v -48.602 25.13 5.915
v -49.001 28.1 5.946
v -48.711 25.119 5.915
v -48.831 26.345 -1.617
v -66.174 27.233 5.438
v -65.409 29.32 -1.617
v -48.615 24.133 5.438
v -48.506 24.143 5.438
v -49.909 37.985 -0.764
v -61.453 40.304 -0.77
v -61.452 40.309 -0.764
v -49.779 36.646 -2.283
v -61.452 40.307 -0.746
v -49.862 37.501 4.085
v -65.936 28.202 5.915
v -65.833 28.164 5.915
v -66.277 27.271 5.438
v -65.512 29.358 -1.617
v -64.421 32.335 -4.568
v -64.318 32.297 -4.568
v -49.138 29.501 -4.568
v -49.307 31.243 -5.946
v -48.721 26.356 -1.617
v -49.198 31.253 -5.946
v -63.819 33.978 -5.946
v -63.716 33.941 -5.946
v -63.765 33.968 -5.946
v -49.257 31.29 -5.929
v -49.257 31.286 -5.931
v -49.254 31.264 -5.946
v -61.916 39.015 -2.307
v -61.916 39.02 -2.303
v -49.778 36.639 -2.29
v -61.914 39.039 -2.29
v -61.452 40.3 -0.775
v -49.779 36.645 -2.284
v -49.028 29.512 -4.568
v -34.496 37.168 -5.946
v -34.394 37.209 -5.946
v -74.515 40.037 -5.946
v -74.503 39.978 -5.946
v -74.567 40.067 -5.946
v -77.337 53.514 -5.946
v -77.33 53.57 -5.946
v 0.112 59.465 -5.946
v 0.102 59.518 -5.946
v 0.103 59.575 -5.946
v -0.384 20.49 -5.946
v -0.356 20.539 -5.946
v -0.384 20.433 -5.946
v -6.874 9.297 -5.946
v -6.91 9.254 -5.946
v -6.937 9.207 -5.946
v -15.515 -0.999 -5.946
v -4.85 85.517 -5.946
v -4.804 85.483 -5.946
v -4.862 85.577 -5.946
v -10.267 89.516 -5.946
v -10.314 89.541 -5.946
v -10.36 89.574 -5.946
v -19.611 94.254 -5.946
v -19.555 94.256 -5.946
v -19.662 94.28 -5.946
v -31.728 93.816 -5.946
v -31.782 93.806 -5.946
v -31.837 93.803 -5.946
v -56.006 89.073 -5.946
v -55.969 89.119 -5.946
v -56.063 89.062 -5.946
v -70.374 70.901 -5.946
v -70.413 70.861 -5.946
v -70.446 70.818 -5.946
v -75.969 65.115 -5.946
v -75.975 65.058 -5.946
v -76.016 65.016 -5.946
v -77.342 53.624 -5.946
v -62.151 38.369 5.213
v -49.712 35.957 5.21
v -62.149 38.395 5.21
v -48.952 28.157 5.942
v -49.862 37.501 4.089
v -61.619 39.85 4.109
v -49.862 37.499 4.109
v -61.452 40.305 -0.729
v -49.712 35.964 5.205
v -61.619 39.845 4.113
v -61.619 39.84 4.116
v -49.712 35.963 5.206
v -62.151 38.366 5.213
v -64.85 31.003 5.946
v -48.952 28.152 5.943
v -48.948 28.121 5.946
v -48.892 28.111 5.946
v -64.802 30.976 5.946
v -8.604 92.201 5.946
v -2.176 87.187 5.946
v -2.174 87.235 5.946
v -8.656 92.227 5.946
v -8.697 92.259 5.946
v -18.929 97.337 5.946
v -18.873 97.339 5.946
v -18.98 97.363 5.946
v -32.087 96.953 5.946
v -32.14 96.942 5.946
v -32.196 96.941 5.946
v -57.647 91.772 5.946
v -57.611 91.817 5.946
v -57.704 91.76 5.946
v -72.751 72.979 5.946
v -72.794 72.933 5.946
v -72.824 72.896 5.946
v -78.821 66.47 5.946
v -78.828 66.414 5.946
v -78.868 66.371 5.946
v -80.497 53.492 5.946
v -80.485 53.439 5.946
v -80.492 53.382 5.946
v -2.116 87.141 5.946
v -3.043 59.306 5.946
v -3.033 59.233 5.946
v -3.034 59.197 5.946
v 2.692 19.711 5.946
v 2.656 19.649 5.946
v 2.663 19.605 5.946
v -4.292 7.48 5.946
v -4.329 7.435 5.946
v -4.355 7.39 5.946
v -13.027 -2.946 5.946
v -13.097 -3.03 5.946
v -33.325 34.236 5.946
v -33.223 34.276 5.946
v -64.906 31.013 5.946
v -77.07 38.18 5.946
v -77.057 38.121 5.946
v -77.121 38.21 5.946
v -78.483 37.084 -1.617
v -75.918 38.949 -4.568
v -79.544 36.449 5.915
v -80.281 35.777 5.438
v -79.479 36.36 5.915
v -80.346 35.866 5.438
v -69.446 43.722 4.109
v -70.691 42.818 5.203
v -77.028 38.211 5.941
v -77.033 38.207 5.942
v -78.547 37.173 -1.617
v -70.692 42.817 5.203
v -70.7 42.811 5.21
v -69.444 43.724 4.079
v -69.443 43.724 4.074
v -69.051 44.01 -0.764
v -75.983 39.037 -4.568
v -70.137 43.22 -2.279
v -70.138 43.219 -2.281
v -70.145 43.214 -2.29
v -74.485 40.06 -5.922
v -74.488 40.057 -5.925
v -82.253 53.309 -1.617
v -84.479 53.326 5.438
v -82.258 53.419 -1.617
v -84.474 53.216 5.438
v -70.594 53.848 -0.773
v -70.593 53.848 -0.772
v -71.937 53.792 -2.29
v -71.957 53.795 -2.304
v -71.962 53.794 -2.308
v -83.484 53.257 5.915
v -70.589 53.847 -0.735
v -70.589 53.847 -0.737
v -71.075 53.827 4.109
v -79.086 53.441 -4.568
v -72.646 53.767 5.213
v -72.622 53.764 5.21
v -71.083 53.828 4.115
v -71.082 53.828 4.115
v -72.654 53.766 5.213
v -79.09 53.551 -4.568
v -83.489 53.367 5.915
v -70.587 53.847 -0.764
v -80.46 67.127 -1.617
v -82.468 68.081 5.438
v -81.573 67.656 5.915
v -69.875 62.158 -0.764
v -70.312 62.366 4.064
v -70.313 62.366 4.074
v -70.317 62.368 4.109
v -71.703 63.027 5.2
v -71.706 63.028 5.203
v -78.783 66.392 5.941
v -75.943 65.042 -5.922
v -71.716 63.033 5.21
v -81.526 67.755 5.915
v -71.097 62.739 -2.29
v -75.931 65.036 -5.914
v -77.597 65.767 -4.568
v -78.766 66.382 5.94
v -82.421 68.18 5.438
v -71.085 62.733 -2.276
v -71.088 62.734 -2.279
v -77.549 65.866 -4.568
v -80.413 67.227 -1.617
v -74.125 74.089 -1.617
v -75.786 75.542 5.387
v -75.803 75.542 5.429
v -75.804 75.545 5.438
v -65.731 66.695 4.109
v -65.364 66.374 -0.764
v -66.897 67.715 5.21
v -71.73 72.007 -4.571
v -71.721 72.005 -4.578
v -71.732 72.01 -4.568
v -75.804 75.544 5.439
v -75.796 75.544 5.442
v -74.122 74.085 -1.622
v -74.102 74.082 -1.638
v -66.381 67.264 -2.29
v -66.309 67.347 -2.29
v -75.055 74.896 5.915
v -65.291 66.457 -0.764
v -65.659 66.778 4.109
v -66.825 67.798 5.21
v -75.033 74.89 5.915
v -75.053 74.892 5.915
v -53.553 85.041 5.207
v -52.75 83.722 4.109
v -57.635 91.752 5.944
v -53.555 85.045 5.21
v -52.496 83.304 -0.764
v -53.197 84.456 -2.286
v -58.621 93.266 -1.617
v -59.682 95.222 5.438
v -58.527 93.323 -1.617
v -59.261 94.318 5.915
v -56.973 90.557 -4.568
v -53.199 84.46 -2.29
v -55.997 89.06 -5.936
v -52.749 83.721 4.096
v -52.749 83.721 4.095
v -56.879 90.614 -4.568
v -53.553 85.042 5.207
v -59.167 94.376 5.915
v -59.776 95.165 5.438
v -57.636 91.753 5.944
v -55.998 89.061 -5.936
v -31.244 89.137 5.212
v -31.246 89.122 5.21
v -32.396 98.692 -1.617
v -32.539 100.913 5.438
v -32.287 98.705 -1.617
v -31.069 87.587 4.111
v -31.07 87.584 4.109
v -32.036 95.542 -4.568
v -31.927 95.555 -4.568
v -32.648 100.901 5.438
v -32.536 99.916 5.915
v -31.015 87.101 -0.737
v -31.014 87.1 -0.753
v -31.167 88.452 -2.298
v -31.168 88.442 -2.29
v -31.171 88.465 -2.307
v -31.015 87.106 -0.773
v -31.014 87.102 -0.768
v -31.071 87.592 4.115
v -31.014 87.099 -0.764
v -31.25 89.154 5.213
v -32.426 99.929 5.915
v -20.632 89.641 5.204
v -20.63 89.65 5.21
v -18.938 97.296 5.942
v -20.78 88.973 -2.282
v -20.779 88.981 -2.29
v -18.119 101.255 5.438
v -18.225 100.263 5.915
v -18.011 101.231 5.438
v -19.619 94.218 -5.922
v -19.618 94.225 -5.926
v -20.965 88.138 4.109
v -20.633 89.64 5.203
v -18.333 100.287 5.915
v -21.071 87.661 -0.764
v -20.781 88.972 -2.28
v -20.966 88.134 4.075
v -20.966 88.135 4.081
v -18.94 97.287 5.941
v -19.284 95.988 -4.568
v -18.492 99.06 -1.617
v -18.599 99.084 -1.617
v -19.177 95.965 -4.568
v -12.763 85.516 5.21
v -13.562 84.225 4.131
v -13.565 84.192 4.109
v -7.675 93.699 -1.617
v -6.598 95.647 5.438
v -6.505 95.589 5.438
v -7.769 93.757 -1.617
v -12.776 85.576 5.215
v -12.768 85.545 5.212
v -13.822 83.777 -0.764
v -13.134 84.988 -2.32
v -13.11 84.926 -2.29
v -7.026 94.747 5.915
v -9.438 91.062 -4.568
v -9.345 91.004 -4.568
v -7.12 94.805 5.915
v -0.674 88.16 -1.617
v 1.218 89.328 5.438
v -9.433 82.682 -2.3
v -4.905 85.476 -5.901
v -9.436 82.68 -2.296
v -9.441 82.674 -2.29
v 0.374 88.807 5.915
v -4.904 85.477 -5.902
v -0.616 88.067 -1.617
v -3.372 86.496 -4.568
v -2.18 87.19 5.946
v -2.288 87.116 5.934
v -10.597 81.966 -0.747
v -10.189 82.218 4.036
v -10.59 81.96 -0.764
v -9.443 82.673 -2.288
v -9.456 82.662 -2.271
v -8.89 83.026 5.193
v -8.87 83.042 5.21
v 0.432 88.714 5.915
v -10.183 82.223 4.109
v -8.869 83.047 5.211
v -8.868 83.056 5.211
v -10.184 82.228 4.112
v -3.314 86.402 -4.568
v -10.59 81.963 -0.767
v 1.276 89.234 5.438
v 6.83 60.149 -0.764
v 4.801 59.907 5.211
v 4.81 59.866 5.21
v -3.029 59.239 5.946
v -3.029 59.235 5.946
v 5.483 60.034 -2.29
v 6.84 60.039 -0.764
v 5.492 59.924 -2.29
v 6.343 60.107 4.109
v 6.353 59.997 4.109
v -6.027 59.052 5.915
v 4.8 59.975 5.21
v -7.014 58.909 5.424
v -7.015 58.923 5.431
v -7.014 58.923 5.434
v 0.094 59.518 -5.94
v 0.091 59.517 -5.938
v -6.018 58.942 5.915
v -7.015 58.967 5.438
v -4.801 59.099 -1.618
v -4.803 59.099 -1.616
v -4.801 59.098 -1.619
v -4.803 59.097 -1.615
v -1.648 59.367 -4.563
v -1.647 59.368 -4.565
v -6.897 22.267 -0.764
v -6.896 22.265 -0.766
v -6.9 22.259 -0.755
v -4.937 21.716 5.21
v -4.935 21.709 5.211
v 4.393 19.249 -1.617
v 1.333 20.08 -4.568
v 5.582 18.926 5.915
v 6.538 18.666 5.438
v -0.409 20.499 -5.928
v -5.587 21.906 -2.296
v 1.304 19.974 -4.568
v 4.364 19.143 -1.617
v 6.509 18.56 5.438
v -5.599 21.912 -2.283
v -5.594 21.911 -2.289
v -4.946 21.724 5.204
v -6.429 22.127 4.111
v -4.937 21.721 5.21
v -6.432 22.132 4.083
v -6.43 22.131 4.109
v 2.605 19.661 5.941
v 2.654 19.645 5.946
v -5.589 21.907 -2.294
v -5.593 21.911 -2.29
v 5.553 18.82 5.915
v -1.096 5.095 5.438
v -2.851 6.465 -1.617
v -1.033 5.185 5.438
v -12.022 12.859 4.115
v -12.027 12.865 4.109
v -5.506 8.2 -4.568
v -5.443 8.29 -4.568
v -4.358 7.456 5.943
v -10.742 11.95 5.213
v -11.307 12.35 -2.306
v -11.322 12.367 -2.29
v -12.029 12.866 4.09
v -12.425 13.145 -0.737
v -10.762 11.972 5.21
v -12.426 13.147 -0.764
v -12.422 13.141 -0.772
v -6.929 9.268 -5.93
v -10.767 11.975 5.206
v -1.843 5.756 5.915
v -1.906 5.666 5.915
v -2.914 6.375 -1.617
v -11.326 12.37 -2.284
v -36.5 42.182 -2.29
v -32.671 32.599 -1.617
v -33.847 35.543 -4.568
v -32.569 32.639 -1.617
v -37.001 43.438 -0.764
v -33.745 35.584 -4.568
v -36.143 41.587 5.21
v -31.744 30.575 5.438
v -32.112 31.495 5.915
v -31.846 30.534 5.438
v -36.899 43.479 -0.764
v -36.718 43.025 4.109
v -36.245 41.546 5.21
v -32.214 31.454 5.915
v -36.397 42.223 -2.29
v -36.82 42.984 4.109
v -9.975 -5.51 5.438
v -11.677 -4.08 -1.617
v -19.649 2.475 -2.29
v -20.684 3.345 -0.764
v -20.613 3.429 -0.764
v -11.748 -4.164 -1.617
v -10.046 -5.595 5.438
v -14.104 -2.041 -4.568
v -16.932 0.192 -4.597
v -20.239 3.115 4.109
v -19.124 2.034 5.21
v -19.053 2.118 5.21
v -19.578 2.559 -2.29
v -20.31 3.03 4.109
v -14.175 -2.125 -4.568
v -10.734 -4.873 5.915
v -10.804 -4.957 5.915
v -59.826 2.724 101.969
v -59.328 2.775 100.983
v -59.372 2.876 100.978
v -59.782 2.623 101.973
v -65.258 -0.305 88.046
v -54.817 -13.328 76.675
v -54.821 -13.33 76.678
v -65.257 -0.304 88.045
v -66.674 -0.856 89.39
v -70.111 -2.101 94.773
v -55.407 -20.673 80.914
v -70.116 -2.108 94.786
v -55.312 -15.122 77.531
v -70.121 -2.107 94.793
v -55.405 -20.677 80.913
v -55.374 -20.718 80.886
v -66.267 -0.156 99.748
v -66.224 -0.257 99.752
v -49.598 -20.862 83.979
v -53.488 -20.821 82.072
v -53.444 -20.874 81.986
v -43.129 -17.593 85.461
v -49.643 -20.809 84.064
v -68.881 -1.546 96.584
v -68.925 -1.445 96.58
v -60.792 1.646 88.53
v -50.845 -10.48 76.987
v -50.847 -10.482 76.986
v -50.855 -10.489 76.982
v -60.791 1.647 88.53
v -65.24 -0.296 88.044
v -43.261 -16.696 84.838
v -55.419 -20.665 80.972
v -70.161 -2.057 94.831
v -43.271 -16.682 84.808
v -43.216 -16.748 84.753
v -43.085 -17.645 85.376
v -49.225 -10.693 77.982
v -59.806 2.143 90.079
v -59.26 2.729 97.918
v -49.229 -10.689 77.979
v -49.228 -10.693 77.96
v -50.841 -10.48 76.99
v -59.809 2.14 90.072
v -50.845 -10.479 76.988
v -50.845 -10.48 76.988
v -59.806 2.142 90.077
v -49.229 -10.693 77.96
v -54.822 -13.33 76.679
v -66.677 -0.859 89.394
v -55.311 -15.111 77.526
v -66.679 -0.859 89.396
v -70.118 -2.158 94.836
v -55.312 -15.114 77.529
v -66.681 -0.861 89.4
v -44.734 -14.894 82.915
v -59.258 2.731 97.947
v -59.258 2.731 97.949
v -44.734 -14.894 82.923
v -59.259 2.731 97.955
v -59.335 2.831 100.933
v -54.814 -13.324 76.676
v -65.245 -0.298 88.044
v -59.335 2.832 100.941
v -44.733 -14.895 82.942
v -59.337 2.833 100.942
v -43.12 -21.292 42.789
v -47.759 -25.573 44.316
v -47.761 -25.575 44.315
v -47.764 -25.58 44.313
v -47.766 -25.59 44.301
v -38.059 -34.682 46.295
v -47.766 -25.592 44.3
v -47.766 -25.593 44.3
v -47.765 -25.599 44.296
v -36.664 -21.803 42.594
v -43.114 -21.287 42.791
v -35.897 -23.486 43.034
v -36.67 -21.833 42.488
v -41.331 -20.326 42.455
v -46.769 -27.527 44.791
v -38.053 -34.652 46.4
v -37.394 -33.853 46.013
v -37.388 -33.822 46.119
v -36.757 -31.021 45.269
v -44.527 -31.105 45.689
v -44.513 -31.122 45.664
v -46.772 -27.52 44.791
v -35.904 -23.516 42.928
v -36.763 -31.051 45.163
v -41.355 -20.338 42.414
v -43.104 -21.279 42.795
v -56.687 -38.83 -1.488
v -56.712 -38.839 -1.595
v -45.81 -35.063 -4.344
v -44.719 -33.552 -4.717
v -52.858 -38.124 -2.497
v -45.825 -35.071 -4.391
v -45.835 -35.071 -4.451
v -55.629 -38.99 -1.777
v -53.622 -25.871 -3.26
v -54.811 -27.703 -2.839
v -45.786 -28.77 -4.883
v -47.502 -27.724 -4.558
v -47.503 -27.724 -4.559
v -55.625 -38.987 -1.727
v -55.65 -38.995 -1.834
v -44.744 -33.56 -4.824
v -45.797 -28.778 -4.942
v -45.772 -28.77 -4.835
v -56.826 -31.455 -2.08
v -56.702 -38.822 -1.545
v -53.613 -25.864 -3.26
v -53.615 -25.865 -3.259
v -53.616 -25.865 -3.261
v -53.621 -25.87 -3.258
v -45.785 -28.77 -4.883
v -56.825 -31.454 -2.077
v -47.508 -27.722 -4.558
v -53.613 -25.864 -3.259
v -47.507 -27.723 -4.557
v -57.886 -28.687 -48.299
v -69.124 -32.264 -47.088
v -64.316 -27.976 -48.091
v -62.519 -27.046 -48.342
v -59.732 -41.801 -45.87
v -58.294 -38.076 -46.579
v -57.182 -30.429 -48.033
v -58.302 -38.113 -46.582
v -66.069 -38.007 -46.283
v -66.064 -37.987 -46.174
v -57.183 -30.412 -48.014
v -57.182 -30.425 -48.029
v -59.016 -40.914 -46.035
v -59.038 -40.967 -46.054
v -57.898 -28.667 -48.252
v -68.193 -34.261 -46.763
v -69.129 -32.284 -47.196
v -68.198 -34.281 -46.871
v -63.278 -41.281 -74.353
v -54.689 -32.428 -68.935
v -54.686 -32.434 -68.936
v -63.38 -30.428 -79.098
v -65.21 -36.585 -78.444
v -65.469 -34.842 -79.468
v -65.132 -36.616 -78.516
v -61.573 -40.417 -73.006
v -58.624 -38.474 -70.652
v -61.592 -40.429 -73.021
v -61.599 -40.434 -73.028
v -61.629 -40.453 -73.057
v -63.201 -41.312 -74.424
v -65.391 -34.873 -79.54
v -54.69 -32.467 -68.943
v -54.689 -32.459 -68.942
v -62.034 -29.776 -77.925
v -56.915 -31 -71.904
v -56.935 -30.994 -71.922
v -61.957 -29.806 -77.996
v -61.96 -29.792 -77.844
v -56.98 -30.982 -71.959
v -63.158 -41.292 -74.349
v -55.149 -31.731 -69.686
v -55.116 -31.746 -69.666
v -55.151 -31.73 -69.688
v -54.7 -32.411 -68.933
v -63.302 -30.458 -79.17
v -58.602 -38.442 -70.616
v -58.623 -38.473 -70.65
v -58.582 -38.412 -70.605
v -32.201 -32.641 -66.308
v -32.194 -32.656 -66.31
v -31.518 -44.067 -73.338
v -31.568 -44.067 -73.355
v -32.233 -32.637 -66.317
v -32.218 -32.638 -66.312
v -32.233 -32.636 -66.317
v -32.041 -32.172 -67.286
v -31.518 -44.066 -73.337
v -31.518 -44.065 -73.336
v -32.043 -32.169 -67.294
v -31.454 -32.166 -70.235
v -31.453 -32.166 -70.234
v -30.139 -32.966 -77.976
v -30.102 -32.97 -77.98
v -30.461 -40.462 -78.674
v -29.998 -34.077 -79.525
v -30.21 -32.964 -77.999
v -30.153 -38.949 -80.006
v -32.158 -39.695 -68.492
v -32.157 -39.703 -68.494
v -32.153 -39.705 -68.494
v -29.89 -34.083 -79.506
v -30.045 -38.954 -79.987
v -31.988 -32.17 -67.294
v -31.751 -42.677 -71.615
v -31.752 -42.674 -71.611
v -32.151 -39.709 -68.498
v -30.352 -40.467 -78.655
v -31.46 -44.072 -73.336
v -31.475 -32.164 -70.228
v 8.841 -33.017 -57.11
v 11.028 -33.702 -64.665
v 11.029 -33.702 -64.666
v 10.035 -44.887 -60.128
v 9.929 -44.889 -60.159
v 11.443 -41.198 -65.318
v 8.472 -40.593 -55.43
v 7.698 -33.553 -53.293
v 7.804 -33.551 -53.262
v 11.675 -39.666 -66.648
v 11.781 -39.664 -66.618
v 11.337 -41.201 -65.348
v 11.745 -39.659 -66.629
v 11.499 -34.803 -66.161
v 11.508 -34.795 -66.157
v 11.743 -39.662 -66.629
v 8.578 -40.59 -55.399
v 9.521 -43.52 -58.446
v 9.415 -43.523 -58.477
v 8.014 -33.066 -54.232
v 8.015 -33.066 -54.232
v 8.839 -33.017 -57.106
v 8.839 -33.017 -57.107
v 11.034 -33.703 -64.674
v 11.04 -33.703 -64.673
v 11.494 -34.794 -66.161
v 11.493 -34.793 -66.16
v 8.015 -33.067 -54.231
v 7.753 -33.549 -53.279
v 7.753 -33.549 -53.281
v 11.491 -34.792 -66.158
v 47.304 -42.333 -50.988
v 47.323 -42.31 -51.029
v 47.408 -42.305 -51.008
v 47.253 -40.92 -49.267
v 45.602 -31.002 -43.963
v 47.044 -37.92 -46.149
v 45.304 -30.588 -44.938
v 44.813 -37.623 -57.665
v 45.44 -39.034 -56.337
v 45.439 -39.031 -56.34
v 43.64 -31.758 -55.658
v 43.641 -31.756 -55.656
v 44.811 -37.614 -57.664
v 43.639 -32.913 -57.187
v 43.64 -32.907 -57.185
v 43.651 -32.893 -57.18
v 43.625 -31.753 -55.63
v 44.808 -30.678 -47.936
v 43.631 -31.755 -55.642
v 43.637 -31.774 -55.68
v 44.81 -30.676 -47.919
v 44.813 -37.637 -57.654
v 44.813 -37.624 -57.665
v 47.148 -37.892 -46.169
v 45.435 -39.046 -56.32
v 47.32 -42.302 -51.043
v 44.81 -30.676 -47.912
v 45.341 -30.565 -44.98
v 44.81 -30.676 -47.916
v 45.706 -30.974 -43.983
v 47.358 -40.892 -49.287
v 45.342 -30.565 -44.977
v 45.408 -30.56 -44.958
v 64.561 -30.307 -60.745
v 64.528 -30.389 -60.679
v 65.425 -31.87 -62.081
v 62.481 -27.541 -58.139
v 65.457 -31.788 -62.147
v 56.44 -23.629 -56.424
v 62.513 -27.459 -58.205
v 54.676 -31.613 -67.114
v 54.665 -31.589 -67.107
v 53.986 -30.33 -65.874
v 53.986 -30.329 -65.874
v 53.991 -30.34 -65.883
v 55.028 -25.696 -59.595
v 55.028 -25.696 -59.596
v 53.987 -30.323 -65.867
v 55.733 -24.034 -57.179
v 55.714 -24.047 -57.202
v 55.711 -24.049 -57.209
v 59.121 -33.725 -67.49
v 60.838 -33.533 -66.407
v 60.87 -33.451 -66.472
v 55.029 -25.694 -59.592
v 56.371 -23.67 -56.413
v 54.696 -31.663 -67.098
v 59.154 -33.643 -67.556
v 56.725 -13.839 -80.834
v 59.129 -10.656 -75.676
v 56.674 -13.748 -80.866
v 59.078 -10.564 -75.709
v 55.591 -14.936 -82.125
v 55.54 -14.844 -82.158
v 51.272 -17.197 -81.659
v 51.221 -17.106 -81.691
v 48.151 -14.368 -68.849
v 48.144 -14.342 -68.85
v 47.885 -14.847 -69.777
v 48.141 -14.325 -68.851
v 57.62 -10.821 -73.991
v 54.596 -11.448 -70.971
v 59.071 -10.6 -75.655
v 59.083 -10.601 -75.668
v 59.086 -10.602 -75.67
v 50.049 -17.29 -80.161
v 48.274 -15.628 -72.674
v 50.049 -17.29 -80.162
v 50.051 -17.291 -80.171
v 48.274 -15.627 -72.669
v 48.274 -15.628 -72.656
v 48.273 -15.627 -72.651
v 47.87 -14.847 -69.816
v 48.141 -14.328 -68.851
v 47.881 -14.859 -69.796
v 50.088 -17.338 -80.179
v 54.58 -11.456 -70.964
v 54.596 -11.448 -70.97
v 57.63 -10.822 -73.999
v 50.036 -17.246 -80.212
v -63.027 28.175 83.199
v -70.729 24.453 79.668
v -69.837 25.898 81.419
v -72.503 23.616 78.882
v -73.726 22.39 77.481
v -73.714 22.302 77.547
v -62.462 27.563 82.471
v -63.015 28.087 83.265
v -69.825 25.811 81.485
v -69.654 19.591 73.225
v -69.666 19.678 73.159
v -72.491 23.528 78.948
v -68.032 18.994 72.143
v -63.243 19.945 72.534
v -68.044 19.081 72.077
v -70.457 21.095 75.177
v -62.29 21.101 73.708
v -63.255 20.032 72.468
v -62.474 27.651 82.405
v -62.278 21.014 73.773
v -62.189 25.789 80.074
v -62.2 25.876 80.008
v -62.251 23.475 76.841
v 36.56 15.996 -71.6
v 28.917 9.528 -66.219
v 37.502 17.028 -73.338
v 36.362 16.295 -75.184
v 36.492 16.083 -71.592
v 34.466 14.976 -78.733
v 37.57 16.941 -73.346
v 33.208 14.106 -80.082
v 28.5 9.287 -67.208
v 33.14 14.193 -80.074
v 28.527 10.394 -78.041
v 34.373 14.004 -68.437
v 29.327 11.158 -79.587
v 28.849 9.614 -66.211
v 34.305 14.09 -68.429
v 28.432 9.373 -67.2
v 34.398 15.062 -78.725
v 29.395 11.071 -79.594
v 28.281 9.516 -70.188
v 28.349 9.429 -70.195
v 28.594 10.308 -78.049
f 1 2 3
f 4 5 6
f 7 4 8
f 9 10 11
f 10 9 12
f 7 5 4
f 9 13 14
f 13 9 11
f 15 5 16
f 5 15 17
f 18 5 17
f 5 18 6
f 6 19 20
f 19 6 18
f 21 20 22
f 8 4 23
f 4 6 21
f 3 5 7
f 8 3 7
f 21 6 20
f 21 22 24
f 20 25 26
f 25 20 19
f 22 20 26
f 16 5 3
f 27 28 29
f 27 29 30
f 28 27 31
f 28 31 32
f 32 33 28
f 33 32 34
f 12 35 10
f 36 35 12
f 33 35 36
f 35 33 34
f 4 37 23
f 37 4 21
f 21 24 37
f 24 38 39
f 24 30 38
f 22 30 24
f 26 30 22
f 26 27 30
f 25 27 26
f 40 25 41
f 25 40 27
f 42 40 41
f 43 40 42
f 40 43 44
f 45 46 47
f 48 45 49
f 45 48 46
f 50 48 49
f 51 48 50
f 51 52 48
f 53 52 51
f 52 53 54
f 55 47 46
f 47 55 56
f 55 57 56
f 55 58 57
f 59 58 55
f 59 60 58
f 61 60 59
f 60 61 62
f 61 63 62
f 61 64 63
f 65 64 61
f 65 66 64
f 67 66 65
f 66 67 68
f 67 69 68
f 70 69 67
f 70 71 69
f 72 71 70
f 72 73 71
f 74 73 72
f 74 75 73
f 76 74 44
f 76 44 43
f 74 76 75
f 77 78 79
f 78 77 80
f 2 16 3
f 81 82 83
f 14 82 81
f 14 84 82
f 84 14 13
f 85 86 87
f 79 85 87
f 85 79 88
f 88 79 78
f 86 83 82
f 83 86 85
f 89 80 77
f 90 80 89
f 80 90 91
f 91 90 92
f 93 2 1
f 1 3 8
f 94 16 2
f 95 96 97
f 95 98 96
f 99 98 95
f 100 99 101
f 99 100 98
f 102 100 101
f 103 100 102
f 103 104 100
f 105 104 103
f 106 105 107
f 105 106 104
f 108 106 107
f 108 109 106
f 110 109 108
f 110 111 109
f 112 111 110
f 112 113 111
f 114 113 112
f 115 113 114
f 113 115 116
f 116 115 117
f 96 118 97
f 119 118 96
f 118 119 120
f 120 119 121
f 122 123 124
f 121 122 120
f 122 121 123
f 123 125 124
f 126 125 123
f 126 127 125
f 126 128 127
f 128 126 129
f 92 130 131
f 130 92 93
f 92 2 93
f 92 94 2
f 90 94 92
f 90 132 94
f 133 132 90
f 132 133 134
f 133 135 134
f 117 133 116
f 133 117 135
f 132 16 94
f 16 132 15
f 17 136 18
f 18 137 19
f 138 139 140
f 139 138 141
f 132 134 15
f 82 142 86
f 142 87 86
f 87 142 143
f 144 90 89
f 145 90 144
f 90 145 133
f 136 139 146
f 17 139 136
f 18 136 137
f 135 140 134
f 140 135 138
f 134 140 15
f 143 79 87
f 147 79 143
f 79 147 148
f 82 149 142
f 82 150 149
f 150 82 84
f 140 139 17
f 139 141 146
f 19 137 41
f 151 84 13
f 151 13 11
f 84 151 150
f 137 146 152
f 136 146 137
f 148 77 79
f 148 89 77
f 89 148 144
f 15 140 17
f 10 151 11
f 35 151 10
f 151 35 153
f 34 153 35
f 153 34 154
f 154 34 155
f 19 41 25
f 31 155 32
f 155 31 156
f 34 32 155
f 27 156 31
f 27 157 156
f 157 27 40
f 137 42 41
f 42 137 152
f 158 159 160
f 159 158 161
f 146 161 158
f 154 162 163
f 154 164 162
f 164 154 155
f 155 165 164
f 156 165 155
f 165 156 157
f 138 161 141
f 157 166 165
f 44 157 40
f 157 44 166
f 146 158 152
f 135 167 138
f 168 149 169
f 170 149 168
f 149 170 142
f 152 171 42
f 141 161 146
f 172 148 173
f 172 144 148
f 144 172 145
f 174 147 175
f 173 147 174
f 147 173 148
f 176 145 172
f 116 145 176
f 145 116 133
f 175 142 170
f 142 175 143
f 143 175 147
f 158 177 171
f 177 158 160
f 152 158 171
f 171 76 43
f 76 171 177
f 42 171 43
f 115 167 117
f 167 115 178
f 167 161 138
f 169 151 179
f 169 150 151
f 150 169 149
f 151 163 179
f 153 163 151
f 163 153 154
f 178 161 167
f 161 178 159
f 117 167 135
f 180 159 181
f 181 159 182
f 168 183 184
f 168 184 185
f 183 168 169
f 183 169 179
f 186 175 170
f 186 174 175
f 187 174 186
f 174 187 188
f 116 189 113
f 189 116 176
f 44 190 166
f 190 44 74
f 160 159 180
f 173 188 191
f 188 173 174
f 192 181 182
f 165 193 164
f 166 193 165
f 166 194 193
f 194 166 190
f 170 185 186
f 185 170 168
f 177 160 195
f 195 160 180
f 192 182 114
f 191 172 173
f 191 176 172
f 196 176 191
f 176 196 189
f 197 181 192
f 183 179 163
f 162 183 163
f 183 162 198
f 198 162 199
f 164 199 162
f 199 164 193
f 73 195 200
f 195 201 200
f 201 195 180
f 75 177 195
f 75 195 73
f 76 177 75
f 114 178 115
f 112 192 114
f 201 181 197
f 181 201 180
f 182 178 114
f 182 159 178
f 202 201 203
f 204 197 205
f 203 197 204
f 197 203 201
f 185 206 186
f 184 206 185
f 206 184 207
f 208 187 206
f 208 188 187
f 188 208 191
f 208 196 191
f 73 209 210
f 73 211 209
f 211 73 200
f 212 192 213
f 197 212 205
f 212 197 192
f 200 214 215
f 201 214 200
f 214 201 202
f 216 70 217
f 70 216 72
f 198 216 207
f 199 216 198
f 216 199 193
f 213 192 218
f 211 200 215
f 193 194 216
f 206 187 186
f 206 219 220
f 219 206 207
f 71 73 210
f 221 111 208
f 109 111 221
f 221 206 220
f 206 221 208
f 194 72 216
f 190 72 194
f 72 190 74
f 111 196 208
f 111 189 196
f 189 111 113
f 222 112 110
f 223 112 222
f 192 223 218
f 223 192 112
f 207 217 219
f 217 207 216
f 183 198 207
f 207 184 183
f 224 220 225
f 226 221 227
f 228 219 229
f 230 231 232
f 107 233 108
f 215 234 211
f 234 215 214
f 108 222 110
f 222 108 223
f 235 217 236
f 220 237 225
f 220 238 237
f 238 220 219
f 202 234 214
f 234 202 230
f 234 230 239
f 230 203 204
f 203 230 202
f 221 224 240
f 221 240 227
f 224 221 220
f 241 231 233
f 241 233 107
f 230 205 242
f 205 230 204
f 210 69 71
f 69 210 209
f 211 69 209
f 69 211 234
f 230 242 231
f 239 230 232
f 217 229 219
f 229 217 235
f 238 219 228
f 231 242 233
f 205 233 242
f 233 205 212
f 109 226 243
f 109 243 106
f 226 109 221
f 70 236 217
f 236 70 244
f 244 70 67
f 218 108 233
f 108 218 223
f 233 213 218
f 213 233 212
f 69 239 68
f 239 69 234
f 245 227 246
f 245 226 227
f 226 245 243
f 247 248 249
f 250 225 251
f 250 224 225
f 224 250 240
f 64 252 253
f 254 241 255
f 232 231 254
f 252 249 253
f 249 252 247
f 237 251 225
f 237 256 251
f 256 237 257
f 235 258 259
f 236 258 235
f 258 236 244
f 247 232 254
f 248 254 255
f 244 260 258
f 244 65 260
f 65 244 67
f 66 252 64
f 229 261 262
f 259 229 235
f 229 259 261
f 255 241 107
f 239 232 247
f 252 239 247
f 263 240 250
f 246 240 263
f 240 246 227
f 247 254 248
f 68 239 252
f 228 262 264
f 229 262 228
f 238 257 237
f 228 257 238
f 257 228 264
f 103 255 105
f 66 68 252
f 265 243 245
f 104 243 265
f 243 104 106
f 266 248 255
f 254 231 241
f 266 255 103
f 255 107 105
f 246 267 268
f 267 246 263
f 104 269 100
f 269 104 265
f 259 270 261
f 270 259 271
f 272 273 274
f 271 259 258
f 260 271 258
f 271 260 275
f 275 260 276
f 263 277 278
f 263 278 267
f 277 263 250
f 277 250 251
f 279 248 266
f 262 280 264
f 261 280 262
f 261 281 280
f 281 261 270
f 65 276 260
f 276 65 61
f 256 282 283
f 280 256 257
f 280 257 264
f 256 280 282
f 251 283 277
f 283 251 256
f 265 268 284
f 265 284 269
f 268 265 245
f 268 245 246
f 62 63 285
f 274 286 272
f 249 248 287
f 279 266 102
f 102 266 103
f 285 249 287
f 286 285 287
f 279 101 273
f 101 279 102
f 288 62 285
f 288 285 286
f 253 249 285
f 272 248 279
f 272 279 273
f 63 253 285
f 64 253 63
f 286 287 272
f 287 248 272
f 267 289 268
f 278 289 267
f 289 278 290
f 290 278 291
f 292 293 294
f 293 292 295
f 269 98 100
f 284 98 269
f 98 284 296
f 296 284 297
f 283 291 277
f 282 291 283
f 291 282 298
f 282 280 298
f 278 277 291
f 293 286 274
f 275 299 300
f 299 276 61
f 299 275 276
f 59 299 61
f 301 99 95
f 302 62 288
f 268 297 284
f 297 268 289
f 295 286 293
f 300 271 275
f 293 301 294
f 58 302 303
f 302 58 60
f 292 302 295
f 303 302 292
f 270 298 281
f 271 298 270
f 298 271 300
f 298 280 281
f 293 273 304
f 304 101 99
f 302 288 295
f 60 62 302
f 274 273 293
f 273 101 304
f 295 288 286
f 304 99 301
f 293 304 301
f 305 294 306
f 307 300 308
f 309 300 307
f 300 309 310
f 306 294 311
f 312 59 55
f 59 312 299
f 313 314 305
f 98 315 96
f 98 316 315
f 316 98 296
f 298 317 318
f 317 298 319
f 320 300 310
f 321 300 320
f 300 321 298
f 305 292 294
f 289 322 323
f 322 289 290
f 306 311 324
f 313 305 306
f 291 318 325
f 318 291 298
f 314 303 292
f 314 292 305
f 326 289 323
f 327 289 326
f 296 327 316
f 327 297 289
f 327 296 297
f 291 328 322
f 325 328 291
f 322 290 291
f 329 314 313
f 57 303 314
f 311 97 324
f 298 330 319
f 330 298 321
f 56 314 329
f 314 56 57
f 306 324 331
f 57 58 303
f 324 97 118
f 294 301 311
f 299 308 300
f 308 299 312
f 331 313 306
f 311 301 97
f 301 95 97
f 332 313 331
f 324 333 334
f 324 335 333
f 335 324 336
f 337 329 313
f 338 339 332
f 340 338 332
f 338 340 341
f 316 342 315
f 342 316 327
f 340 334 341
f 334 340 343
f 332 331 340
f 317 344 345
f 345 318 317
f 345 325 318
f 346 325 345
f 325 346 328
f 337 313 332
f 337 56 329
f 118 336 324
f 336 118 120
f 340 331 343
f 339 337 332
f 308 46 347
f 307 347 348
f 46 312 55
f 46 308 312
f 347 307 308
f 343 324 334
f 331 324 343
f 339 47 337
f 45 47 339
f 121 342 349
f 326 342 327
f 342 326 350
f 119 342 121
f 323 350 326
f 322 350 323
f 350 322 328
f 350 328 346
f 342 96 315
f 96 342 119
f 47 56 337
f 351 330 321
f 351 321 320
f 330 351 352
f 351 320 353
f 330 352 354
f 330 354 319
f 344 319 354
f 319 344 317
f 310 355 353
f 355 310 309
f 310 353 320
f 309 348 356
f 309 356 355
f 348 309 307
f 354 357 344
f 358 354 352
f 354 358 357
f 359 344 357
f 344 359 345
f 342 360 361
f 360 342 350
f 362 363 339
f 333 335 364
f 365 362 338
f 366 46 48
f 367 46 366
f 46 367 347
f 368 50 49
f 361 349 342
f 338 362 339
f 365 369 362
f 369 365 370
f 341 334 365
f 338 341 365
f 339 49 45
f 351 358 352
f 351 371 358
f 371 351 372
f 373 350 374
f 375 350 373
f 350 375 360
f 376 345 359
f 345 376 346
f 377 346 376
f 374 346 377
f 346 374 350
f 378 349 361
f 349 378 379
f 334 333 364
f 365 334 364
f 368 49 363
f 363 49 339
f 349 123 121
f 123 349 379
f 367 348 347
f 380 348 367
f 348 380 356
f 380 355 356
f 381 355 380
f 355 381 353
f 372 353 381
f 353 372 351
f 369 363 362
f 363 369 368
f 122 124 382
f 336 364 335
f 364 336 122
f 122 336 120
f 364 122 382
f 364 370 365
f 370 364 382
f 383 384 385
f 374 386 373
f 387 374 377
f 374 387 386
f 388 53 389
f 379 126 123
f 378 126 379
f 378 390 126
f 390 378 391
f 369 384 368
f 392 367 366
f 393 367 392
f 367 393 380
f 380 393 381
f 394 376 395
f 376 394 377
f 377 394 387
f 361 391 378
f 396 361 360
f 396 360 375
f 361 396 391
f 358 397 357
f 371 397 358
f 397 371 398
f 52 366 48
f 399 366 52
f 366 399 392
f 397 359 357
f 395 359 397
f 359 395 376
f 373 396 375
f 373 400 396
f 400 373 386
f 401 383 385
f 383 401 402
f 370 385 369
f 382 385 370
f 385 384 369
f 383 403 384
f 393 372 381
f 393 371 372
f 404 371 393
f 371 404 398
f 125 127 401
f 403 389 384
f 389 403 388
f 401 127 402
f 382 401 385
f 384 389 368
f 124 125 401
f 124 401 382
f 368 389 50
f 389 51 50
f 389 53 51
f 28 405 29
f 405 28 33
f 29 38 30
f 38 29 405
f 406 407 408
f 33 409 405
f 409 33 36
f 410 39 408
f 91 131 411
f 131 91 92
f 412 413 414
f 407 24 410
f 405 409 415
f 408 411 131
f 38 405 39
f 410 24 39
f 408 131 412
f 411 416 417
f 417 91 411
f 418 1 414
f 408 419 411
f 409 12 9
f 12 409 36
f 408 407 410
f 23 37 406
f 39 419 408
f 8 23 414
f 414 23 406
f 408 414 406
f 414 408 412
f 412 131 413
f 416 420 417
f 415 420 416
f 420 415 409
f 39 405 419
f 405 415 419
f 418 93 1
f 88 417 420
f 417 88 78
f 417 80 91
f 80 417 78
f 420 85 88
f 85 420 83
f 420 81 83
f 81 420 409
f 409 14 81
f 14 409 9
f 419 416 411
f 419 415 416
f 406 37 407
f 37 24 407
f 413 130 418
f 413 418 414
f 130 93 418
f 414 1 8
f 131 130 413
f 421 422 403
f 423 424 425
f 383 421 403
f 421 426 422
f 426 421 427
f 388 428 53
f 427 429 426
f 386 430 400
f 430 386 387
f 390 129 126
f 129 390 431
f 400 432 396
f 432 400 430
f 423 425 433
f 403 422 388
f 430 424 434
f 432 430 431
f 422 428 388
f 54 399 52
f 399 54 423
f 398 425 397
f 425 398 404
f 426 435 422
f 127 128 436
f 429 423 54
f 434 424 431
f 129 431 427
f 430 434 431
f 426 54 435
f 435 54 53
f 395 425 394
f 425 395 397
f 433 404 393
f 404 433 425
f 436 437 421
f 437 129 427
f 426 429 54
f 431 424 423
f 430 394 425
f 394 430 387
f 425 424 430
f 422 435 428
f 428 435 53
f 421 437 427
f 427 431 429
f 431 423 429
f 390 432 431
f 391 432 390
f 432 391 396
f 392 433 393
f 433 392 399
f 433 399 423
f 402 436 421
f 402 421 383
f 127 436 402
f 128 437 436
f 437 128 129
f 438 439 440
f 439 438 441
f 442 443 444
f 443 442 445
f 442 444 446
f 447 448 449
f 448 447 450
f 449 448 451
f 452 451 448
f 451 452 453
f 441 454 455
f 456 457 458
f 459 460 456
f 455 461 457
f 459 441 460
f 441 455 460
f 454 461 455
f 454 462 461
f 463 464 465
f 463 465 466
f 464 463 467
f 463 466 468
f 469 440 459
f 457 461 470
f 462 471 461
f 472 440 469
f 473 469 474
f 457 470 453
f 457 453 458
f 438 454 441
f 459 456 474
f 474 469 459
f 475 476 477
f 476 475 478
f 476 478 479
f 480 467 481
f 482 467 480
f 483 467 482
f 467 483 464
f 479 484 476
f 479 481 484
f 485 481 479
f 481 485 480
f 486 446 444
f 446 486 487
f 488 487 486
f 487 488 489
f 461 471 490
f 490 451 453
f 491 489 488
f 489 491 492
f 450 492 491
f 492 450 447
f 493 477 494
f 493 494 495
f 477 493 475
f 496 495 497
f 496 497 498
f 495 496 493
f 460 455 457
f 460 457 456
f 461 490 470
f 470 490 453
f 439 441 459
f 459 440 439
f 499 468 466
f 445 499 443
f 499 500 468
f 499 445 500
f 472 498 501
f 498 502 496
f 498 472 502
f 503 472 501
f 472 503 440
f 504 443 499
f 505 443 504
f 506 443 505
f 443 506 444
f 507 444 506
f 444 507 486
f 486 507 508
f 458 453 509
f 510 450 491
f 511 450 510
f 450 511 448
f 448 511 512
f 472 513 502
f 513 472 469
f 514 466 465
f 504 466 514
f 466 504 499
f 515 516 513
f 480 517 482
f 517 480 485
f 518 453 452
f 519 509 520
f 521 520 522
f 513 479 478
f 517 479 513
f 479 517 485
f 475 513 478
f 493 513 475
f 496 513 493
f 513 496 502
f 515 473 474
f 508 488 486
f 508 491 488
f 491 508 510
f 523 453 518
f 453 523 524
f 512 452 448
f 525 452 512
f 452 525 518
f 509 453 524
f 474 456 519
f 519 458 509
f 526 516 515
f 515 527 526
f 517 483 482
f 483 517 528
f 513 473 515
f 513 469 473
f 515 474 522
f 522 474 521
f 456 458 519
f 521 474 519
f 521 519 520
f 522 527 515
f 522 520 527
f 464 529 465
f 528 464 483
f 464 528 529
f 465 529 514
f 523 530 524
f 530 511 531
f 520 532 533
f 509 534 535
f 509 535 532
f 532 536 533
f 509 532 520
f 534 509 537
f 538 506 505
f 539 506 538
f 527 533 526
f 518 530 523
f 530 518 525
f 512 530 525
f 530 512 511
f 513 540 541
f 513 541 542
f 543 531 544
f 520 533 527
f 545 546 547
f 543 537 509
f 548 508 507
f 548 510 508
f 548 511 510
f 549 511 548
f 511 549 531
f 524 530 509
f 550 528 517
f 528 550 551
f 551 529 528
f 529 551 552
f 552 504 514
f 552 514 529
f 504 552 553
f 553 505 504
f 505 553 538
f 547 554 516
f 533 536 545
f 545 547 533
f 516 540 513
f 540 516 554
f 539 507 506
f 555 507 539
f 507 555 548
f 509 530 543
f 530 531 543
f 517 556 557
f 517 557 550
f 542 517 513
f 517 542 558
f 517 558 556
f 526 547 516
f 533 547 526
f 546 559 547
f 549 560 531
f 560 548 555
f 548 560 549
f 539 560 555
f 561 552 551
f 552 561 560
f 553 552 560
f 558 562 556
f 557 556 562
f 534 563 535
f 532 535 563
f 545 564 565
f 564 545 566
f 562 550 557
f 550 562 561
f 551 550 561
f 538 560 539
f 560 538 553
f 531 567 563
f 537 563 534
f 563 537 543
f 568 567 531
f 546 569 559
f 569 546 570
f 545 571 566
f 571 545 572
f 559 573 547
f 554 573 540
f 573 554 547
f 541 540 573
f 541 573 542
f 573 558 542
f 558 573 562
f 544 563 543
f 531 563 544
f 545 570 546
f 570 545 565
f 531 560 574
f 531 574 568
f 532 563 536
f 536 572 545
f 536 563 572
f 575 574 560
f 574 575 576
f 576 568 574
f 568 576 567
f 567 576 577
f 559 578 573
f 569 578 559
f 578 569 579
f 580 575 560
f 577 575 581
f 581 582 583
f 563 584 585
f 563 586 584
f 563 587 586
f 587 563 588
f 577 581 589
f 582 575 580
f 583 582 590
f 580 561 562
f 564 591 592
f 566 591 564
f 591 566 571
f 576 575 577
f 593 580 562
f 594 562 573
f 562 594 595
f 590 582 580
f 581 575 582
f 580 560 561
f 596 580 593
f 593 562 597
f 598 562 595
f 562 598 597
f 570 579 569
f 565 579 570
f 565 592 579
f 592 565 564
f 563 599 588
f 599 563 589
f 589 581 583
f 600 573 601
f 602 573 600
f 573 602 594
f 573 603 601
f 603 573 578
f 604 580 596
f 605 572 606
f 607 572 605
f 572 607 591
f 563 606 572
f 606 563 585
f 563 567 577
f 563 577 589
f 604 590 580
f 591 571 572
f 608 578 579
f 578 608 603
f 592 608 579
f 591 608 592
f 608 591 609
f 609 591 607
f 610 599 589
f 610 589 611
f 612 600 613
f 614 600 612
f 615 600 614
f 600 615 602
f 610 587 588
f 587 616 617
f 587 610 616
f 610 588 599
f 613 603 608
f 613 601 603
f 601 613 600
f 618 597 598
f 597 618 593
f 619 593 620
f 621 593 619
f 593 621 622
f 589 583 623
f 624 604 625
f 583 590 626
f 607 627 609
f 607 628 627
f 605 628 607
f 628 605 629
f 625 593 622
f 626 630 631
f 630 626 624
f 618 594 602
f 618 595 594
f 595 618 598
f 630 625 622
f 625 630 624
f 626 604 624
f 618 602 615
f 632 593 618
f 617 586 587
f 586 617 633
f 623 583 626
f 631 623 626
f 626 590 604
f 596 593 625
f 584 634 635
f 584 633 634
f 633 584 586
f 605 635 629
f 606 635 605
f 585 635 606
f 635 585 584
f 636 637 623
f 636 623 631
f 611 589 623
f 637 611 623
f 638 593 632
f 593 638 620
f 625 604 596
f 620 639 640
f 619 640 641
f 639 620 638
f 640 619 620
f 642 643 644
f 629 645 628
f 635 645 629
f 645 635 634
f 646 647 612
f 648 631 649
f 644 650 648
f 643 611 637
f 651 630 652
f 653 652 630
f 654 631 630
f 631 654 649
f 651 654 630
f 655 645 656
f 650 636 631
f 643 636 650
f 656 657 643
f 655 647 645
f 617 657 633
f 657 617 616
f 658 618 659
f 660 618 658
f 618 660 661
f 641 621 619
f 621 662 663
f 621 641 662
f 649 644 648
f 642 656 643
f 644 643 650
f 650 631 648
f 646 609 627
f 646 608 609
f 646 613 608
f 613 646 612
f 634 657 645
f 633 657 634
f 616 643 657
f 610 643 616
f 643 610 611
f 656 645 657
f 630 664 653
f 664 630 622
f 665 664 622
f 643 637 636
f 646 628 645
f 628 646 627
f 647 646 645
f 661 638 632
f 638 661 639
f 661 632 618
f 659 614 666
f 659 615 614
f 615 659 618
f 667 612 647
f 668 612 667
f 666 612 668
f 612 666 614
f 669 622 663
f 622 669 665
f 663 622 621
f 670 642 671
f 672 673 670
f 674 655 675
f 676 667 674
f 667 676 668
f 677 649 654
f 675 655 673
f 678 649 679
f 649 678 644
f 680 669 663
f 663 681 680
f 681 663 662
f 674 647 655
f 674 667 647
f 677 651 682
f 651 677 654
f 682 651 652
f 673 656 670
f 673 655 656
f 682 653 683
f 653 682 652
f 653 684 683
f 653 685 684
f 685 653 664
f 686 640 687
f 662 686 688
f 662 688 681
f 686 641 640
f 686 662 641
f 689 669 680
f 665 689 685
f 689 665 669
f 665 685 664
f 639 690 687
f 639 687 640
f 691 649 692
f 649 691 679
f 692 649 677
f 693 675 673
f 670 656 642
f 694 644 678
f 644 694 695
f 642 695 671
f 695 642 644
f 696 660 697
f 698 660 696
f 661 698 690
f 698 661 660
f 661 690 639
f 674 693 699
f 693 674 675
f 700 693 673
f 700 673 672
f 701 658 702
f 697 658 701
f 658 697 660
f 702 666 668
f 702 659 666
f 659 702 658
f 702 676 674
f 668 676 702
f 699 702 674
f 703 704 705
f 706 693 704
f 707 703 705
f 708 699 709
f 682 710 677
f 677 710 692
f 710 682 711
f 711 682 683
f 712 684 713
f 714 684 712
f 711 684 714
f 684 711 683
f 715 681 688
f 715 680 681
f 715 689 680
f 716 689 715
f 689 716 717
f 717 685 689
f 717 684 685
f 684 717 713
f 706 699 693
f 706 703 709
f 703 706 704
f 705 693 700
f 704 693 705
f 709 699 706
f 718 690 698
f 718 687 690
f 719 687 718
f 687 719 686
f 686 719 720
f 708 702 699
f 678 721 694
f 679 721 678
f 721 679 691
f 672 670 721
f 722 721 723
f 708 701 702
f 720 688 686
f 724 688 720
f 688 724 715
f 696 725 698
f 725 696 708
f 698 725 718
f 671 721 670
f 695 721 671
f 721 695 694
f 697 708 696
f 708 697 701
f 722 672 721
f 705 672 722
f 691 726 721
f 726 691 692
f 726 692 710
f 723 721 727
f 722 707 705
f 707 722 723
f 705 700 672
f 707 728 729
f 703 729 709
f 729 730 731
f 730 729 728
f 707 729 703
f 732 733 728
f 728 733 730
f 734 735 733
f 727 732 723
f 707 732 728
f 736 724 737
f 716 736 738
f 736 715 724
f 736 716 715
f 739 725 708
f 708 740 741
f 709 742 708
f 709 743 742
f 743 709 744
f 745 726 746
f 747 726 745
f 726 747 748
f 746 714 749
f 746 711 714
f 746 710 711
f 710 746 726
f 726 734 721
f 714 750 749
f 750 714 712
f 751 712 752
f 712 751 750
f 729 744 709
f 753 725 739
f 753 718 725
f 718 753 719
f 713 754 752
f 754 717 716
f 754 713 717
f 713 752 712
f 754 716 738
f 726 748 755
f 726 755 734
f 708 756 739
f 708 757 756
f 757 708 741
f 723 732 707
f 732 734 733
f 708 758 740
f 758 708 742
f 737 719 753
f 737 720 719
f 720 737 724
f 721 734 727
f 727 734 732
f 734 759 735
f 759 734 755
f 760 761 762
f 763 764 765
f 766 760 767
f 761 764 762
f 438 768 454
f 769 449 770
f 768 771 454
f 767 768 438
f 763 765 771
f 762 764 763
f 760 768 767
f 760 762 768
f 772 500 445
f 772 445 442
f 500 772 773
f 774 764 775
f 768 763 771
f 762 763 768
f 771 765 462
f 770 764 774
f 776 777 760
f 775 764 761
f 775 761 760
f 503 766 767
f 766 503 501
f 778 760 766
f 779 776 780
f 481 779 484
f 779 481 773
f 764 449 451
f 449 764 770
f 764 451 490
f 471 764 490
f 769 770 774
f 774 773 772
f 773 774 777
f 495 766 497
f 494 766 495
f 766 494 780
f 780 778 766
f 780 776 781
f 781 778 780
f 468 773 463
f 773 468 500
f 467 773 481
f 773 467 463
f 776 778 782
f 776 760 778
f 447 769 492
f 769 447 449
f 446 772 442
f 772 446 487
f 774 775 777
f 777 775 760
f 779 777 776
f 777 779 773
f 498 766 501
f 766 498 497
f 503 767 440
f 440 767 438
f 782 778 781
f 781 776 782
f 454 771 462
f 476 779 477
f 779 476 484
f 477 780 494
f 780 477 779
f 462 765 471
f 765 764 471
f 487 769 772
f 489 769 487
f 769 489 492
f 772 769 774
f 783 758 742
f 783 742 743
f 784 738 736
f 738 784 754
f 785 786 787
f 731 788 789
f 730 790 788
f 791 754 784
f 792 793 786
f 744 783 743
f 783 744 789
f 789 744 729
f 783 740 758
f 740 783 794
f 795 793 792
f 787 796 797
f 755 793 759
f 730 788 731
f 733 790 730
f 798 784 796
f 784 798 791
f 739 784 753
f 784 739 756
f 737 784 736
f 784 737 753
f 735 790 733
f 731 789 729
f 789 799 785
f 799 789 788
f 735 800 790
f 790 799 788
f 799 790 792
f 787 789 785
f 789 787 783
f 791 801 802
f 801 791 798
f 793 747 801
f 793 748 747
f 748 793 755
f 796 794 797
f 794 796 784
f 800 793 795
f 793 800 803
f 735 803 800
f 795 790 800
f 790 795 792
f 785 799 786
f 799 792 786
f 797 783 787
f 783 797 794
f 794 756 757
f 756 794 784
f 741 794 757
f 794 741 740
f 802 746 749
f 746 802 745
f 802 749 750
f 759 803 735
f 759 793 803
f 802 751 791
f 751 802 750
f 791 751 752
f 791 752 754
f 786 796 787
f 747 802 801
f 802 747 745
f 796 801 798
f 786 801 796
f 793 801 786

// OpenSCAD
///A few lines mor  make your code work in 3D.
///Exception is  gimball-lock artefacts on  straight z moves since no real quaternion rotations

//////////////////////////////////////////////////// Old function getangle(vector)=[0,0,-atan2(vector[0],vector[1])];//////////////////////////////////////////////////// 
//////////////////////////////////// New Sauce //////////////////////////////////////
function getangle(v) = (len(v) == 3) ? [0, 90, 0] + geteuler(lim3(1, v)): [90, 0, 0] + [0, 0, -atan2(v[0], v[1])];
function geteuler(v) = [0, -asin(v[2]), atan2(v2xy(v)[1], v2xy(v)[0])]; //Euler angles from Vec3
function v2xy(v) = lim3(1, [v[0], v[1], 0]); // down  projection xyz2xy
function lim3(l, v) = v / len3(v) * l; // normalize Vec37Vec4 to magnitude l
function len3(v) = sqrt(pow(v[0], 2) + pow(v[1], 2) + pow(v[2], 2)); // find magnitude of Vec3
//////////////////////////////////////////////////////////////////////////////////////////////////////////////////////////////////////////////////

// FollowPath Extrusion
// (c) 2013 Wouter Robers
path3d = [
  [-67.8509, 23.3115, 77.6378],
  [-64.7054, 0.307143, 95.027],
  [-50.7696, -16.9558, 81.0949],
  [-41.9771, -26.9999, 44.4277],
  [-51.9501, -31.5773, -3.16171],
  [-63.3934, -33.86, -47.0519],
  [-60.9717, -35.7994, -74.2041],
  [-31.31, -38.1267, -73.162],
  [9.7399, -38.946, -59.9703],
  [45.7945, -36.5815, -50.7952],
  [59.938, -29.5766, -61.9239],
  [53.9179, -13.5185, -75.4887],
  [32.9007, 13.2599, -73.1502]
];
path2d = [
  [-34.423721, 36.985889],
  [-49.288333, 31.047708],
  [-63.886651, 33.794279],
  [-74.725831, 39.951233],
  [-77.537431, 53.615379],
  [-76.145624, 65.199347],
  [-70.521591, 71.029779],
  [-56.071201, 89.286859],
  [-31.750381, 94.010719],
  [-19.512594, 94.447331],
  [-10.163321, 89.683029],
  [-4.636911, 85.585889],
  [-0.092381, 59.557939],
  [-0.195281, 20.381239],
  [-6.777137, 9.094524],
  [-15.364711, -1.125061]
];

shape = [
  [-6.947730, 5.438190],
  [-4.737390, 3.060760],
  [-4.724490, -1.617340],
  [-2.536640, -2.696480],
  [-1.554030, -4.568120],
  [0.196060, -5.945800],
  [2.046570, -4.596910],
  [3.074680, -2.882730],
  [5.595670, -2.290310],
  [6.947730, -0.764330],
  [5.596470, 1.641280],
  [6.459250, 4.108950],
  [4.910350, 5.210150],
  [0.995560, 5.570330],
  [-2.961680, 5.945800],
  [-5.956510, 5.915000],
  [-6.947670, 5.438140]
];
shaperotate = [0, 0, 0];
shapethickness = 0.11;
FollowPath(shape, path2d, shaperotate);
FollowPath(shape, path3d, shaperotate);

module FollowPath(shape, path, shaperotate){
hull() {
  translate(path[0]) rotate(getangle(path[1] - path[0])) rotate(shaperotate) linear_extrude(height = shapethickness) polygon(shape);
  translate(path[1]) rotate((getangle(path[1] - path[0]) + getangle(path[2] - path[1])) / 2) rotate(shaperotate) linear_extrude(height = shapethickness) polygon(shape);
}
for(i = [1: len(path) - 3]) {
  hull() {
    translate(path[i]) rotate((getangle(path[i] - path[i - 1]) + getangle(path[i + 1] - path[i])) / 2) rotate(shaperotate) linear_extrude(height = shapethickness) polygon(shape);
    translate(path[i + 1]) rotate((getangle(path[i + 1] - path[i]) + getangle(path[i + 2] - path[i + 1])) / 2) rotate(shaperotate) linear_extrude(height = shapethickness) polygon(shape);
  }}
  hull() {
    translate(path[len(path) - 2]) rotate((getangle(path[len(path) - 2] - path[len(path) - 3]) + getangle(path[len(path) - 1] - path[len(path) - 2])) / 2) rotate(shaperotate) linear_extrude(height = shapethickness) polygon(shape);
    translate(path[len(path) - 1]) rotate(getangle(path[len(path) - 1] - path[len(path) - 2])) rotate(shaperotate) linear_extrude(height = shapethickness) polygon(shape);
  }
}
